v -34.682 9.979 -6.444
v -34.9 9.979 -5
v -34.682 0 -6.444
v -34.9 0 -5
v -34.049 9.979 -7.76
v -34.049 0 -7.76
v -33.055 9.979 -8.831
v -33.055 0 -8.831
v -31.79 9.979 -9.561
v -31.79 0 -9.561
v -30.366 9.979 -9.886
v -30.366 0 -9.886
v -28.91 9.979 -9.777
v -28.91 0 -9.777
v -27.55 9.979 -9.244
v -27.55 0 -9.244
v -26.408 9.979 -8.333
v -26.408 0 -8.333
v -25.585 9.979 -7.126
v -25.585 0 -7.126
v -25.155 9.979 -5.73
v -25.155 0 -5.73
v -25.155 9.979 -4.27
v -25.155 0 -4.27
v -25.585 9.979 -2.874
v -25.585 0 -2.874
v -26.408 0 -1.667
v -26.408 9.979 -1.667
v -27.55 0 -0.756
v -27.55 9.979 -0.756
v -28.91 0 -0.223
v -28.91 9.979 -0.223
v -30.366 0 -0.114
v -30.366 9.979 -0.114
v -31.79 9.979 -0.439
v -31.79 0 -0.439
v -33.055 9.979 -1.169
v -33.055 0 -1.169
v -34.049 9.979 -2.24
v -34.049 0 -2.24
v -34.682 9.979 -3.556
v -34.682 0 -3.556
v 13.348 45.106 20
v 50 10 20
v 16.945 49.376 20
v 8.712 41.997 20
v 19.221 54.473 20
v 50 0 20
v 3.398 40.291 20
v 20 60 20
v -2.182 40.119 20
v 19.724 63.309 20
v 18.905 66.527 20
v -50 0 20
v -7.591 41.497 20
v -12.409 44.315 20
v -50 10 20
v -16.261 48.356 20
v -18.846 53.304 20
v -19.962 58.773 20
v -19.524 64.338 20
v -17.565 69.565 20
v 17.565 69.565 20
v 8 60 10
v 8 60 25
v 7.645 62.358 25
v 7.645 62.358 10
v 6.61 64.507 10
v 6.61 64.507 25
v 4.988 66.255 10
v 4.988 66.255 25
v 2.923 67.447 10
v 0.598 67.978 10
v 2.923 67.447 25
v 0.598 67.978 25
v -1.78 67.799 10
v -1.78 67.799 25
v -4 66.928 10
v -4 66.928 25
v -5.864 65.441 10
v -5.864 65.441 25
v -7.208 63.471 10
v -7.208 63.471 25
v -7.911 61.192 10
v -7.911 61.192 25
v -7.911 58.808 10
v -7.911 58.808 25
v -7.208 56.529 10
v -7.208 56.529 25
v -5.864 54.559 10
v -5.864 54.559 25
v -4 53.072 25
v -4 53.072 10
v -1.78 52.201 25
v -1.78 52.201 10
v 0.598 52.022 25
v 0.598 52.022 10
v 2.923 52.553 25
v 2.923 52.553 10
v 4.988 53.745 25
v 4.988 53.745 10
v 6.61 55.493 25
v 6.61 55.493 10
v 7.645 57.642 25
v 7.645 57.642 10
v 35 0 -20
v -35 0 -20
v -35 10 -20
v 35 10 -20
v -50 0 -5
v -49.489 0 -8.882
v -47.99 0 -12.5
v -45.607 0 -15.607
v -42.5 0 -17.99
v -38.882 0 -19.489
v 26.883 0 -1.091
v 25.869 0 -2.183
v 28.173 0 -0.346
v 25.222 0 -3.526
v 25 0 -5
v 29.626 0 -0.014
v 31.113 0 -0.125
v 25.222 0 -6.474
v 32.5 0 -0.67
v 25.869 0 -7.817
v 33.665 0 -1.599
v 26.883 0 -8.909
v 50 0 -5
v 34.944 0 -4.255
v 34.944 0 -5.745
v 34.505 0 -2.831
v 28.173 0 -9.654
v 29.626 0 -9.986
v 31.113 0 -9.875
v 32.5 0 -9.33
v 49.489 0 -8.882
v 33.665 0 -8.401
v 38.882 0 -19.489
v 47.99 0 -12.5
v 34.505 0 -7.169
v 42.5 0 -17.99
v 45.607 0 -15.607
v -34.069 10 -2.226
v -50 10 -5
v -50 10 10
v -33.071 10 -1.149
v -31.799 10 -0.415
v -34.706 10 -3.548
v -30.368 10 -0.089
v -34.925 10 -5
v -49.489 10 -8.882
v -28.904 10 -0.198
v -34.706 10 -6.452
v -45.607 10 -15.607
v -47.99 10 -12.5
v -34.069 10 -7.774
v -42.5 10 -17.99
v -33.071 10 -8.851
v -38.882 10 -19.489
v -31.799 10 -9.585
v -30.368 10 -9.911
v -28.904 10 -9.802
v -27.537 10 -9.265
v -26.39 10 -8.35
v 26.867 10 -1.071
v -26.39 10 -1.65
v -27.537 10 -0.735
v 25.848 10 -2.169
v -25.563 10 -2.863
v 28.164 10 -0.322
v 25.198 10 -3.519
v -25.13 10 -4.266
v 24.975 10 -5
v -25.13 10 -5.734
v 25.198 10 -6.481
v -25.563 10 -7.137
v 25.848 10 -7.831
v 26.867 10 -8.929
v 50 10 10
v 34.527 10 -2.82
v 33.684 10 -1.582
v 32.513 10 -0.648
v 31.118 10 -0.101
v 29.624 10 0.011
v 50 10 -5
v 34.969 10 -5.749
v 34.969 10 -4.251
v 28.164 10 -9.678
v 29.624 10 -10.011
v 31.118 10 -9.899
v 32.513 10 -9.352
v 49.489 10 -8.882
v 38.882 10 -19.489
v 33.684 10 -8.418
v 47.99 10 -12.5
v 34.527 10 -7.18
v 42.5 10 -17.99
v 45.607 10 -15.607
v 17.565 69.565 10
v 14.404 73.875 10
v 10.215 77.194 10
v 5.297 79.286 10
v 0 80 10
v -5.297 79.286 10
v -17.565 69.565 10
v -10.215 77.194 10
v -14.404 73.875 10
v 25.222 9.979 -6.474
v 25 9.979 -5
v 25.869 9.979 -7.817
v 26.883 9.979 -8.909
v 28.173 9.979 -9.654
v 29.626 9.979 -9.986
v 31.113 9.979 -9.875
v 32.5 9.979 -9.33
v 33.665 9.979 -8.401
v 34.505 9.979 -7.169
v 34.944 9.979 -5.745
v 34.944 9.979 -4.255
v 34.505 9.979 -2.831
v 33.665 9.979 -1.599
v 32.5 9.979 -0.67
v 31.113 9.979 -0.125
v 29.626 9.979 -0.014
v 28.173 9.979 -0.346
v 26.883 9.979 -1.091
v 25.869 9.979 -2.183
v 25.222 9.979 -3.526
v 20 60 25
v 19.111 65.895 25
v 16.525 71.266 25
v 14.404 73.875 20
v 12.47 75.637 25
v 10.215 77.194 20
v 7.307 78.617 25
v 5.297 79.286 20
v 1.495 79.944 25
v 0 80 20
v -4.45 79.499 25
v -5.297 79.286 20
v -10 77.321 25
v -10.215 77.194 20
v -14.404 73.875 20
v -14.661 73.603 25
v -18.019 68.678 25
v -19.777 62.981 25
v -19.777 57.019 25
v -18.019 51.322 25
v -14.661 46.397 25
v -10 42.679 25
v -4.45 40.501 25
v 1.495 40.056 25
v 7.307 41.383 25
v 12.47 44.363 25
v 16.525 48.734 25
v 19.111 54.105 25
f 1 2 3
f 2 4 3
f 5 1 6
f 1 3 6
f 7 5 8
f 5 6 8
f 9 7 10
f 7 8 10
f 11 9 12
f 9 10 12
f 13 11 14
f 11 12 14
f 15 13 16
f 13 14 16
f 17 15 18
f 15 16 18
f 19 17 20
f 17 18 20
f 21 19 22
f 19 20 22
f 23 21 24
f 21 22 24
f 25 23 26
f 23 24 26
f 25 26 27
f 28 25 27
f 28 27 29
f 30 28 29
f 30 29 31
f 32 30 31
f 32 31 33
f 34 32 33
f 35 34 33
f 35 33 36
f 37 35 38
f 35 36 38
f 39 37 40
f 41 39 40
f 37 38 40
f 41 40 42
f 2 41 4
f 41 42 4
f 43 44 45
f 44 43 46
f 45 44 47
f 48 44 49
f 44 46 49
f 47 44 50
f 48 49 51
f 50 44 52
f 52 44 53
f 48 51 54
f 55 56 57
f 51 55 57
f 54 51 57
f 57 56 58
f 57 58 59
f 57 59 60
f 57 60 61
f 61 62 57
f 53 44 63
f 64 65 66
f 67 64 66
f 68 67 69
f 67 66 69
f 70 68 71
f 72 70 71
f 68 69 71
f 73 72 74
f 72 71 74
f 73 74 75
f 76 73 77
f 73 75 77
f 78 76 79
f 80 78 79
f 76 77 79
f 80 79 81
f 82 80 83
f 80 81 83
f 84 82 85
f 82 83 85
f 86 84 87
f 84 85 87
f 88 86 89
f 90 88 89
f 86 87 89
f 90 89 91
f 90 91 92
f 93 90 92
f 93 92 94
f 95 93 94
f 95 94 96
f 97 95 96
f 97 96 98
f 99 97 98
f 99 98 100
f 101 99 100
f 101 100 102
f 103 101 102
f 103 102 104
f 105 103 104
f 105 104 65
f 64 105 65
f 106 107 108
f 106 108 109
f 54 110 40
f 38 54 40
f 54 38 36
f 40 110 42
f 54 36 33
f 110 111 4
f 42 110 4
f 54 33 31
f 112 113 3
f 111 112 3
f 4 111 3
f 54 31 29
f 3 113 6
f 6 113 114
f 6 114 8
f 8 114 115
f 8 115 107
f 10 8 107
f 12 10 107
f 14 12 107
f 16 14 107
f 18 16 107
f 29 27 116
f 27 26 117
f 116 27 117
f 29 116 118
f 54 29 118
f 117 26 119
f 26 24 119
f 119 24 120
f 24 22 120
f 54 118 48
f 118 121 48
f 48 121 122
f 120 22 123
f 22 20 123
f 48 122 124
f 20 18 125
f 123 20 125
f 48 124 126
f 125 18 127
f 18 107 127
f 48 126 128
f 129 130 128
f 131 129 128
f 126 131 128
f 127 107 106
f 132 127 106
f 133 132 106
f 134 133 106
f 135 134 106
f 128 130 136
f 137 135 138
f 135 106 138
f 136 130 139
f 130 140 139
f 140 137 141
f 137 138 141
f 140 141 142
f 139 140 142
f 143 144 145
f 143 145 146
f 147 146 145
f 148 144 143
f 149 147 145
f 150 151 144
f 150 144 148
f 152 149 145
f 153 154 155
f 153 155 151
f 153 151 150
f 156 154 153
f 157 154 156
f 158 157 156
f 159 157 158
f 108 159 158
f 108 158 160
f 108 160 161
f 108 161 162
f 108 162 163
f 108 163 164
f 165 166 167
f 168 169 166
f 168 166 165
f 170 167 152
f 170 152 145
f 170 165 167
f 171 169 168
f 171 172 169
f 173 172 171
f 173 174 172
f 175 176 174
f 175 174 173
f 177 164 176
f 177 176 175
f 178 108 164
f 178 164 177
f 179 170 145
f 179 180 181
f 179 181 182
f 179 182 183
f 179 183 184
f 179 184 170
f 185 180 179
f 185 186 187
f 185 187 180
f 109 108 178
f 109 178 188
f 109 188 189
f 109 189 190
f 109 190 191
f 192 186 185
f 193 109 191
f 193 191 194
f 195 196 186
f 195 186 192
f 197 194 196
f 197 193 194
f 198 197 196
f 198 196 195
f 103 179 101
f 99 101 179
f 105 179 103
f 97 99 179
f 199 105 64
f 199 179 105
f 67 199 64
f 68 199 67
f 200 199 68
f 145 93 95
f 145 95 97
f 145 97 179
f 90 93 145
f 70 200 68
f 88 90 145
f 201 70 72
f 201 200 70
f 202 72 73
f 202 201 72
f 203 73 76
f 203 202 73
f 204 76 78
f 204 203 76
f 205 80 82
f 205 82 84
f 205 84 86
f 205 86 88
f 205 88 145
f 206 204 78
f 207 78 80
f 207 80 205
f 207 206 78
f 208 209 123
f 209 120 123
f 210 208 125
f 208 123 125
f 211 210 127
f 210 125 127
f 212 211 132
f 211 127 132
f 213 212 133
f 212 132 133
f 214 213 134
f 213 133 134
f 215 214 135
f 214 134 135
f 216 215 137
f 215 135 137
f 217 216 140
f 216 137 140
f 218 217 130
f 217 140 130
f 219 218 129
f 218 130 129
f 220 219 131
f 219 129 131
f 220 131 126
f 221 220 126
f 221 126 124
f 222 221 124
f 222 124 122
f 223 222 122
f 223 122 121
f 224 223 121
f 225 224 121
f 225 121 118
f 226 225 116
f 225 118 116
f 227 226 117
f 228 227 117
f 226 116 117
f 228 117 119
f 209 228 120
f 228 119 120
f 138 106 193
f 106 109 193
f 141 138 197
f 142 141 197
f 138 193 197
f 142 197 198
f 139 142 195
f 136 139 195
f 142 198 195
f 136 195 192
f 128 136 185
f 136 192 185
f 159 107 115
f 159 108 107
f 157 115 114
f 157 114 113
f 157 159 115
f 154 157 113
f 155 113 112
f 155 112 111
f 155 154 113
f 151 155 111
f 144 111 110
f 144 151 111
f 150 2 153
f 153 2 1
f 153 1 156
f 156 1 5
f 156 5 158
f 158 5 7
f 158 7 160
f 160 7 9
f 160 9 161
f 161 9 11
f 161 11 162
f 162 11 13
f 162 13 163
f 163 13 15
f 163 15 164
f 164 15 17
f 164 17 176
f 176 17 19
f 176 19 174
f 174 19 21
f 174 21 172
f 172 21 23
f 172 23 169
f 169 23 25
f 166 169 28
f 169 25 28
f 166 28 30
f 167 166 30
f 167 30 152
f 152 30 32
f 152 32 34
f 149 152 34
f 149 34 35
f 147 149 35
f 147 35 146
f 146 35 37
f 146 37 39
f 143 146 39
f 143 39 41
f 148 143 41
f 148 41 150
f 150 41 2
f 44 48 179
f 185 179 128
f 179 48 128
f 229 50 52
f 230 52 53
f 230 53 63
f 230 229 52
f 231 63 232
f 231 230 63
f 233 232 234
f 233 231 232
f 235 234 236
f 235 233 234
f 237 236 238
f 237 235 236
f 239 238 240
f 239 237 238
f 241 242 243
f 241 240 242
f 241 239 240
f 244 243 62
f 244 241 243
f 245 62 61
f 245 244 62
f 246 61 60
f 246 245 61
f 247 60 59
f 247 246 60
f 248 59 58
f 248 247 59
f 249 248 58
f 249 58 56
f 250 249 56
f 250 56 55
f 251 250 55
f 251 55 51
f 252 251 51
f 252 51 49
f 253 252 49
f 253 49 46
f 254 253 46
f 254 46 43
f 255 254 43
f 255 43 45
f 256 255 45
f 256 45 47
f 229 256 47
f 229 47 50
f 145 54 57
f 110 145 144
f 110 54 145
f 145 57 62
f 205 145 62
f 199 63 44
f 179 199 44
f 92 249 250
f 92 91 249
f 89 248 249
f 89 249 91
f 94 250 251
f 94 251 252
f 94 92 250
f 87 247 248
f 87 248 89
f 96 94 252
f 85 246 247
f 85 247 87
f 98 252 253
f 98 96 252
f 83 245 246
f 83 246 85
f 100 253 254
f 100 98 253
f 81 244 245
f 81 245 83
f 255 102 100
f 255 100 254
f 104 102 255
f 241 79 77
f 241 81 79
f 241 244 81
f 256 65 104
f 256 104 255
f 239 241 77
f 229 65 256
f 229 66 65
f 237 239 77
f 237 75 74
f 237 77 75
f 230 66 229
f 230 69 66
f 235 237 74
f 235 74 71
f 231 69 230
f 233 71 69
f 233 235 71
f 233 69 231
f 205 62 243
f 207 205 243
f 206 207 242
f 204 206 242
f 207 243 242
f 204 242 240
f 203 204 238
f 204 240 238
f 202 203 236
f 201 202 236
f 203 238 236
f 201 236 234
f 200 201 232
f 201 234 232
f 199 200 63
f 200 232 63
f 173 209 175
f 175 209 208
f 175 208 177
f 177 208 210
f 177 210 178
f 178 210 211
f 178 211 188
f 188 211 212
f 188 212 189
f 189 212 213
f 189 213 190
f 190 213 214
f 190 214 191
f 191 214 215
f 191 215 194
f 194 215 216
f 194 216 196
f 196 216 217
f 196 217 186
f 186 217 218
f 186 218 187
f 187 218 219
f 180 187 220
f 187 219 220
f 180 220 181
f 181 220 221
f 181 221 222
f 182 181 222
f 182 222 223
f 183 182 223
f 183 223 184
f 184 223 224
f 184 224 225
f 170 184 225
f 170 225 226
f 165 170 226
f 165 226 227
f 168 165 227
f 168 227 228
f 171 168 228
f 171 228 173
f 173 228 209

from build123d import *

# Parameters (mm, degrees)
CROQUIS1_W                           = 100
CROQUIS1_H                           = 40
SALIENTE_EXTRUIR1_DEPTH              = 10
CROQUIS2_R                           = 8
SALIENTE_EXTRUIR2_DEPTH              = 10
SALIENTE_EXTRUIR3_START              = 5
CROQUIS3_R                           = 20
CROQUIS3_R_2                         = 8
SALIENTE_EXTRUIR3_DEPTH              = 5
F_9_8_9_8_DIAMETER_HOLE1_D           = 9.8
F_9_8_9_8_DIAMETER_HOLE1_CSINK_D     = 9.85
F_9_8_9_8_DIAMETER_HOLE1_CSINK_ANGLE = 100
F_10_0_10_DIAMETER_HOLE1_D           = 10
F_10_0_10_DIAMETER_HOLE1_CSINK_D     = 10.05
F_10_0_10_DIAMETER_HOLE1_CSINK_ANGLE = 100
REDONDEO1_R                          = 15


with BuildPart() as part:
    # Croquis1 → Saliente-Extruir1 (new body)
    with BuildSketch(Plane(origin=(0, 0, 0), x_dir=(1, 0, 0), z_dir=(0, 1, 0))):
        Rectangle(CROQUIS1_W, CROQUIS1_H)
    extrude(amount=SALIENTE_EXTRUIR1_DEPTH)

    # Croquis2 → Saliente-Extruir2 (add)
    with BuildSketch(Plane.XY.offset(20)):
        with BuildLine():
            Line((-50, 10), (-17.564659966, 69.564659966))
            ThreePointArc((-17.564659966, 69.564659966), (0, 80), (17.564659966, 69.564659966))
            Line((17.564659966, 69.564659966), (50, 10))
            Line((50, 10), (-50, 10))
        make_face()
        with Locations((0, 60)):
            Circle(CROQUIS2_R, mode=Mode.SUBTRACT)
    extrude(amount=-SALIENTE_EXTRUIR2_DEPTH)

    # Croquis3 → Saliente-Extruir3 (add)
    with BuildSketch(Plane.XY.offset(20).offset(SALIENTE_EXTRUIR3_START)):
        with Locations((0, 60)):
            Circle(CROQUIS3_R)
        with Locations((0, 60)):
            Circle(CROQUIS3_R_2, mode=Mode.SUBTRACT)
    extrude(amount=-SALIENTE_EXTRUIR3_DEPTH)

    # Ø9.8 (9.8) Diameter Hole1 (through all)
    with Locations(Plane(origin=(0, 10, 0), x_dir=(1, 0, 0), z_dir=(0, 1, 0))):
        with Locations((-30, 5)):
            CounterSinkHole(F_9_8_9_8_DIAMETER_HOLE1_D / 2, F_9_8_9_8_DIAMETER_HOLE1_CSINK_D / 2, counter_sink_angle=F_9_8_9_8_DIAMETER_HOLE1_CSINK_ANGLE)

    # Ø10.0 (10) Diameter Hole1 (through all)
    with Locations(Plane(origin=(0, 10, 0), x_dir=(1, 0, 0), z_dir=(0, 1, 0))):
        with Locations((30, 5)):
            CounterSinkHole(F_10_0_10_DIAMETER_HOLE1_D / 2, F_10_0_10_DIAMETER_HOLE1_CSINK_D / 2, counter_sink_angle=F_10_0_10_DIAMETER_HOLE1_CSINK_ANGLE)

    # Redondeo1
    redondeo1_edges = [part.edges().sort_by_distance(p)[0] for p in [
        (-50, 5, -20),
        (50, 5, -20),
    ]]
    fillet(redondeo1_edges, radius=REDONDEO1_R)


solid = part.part
